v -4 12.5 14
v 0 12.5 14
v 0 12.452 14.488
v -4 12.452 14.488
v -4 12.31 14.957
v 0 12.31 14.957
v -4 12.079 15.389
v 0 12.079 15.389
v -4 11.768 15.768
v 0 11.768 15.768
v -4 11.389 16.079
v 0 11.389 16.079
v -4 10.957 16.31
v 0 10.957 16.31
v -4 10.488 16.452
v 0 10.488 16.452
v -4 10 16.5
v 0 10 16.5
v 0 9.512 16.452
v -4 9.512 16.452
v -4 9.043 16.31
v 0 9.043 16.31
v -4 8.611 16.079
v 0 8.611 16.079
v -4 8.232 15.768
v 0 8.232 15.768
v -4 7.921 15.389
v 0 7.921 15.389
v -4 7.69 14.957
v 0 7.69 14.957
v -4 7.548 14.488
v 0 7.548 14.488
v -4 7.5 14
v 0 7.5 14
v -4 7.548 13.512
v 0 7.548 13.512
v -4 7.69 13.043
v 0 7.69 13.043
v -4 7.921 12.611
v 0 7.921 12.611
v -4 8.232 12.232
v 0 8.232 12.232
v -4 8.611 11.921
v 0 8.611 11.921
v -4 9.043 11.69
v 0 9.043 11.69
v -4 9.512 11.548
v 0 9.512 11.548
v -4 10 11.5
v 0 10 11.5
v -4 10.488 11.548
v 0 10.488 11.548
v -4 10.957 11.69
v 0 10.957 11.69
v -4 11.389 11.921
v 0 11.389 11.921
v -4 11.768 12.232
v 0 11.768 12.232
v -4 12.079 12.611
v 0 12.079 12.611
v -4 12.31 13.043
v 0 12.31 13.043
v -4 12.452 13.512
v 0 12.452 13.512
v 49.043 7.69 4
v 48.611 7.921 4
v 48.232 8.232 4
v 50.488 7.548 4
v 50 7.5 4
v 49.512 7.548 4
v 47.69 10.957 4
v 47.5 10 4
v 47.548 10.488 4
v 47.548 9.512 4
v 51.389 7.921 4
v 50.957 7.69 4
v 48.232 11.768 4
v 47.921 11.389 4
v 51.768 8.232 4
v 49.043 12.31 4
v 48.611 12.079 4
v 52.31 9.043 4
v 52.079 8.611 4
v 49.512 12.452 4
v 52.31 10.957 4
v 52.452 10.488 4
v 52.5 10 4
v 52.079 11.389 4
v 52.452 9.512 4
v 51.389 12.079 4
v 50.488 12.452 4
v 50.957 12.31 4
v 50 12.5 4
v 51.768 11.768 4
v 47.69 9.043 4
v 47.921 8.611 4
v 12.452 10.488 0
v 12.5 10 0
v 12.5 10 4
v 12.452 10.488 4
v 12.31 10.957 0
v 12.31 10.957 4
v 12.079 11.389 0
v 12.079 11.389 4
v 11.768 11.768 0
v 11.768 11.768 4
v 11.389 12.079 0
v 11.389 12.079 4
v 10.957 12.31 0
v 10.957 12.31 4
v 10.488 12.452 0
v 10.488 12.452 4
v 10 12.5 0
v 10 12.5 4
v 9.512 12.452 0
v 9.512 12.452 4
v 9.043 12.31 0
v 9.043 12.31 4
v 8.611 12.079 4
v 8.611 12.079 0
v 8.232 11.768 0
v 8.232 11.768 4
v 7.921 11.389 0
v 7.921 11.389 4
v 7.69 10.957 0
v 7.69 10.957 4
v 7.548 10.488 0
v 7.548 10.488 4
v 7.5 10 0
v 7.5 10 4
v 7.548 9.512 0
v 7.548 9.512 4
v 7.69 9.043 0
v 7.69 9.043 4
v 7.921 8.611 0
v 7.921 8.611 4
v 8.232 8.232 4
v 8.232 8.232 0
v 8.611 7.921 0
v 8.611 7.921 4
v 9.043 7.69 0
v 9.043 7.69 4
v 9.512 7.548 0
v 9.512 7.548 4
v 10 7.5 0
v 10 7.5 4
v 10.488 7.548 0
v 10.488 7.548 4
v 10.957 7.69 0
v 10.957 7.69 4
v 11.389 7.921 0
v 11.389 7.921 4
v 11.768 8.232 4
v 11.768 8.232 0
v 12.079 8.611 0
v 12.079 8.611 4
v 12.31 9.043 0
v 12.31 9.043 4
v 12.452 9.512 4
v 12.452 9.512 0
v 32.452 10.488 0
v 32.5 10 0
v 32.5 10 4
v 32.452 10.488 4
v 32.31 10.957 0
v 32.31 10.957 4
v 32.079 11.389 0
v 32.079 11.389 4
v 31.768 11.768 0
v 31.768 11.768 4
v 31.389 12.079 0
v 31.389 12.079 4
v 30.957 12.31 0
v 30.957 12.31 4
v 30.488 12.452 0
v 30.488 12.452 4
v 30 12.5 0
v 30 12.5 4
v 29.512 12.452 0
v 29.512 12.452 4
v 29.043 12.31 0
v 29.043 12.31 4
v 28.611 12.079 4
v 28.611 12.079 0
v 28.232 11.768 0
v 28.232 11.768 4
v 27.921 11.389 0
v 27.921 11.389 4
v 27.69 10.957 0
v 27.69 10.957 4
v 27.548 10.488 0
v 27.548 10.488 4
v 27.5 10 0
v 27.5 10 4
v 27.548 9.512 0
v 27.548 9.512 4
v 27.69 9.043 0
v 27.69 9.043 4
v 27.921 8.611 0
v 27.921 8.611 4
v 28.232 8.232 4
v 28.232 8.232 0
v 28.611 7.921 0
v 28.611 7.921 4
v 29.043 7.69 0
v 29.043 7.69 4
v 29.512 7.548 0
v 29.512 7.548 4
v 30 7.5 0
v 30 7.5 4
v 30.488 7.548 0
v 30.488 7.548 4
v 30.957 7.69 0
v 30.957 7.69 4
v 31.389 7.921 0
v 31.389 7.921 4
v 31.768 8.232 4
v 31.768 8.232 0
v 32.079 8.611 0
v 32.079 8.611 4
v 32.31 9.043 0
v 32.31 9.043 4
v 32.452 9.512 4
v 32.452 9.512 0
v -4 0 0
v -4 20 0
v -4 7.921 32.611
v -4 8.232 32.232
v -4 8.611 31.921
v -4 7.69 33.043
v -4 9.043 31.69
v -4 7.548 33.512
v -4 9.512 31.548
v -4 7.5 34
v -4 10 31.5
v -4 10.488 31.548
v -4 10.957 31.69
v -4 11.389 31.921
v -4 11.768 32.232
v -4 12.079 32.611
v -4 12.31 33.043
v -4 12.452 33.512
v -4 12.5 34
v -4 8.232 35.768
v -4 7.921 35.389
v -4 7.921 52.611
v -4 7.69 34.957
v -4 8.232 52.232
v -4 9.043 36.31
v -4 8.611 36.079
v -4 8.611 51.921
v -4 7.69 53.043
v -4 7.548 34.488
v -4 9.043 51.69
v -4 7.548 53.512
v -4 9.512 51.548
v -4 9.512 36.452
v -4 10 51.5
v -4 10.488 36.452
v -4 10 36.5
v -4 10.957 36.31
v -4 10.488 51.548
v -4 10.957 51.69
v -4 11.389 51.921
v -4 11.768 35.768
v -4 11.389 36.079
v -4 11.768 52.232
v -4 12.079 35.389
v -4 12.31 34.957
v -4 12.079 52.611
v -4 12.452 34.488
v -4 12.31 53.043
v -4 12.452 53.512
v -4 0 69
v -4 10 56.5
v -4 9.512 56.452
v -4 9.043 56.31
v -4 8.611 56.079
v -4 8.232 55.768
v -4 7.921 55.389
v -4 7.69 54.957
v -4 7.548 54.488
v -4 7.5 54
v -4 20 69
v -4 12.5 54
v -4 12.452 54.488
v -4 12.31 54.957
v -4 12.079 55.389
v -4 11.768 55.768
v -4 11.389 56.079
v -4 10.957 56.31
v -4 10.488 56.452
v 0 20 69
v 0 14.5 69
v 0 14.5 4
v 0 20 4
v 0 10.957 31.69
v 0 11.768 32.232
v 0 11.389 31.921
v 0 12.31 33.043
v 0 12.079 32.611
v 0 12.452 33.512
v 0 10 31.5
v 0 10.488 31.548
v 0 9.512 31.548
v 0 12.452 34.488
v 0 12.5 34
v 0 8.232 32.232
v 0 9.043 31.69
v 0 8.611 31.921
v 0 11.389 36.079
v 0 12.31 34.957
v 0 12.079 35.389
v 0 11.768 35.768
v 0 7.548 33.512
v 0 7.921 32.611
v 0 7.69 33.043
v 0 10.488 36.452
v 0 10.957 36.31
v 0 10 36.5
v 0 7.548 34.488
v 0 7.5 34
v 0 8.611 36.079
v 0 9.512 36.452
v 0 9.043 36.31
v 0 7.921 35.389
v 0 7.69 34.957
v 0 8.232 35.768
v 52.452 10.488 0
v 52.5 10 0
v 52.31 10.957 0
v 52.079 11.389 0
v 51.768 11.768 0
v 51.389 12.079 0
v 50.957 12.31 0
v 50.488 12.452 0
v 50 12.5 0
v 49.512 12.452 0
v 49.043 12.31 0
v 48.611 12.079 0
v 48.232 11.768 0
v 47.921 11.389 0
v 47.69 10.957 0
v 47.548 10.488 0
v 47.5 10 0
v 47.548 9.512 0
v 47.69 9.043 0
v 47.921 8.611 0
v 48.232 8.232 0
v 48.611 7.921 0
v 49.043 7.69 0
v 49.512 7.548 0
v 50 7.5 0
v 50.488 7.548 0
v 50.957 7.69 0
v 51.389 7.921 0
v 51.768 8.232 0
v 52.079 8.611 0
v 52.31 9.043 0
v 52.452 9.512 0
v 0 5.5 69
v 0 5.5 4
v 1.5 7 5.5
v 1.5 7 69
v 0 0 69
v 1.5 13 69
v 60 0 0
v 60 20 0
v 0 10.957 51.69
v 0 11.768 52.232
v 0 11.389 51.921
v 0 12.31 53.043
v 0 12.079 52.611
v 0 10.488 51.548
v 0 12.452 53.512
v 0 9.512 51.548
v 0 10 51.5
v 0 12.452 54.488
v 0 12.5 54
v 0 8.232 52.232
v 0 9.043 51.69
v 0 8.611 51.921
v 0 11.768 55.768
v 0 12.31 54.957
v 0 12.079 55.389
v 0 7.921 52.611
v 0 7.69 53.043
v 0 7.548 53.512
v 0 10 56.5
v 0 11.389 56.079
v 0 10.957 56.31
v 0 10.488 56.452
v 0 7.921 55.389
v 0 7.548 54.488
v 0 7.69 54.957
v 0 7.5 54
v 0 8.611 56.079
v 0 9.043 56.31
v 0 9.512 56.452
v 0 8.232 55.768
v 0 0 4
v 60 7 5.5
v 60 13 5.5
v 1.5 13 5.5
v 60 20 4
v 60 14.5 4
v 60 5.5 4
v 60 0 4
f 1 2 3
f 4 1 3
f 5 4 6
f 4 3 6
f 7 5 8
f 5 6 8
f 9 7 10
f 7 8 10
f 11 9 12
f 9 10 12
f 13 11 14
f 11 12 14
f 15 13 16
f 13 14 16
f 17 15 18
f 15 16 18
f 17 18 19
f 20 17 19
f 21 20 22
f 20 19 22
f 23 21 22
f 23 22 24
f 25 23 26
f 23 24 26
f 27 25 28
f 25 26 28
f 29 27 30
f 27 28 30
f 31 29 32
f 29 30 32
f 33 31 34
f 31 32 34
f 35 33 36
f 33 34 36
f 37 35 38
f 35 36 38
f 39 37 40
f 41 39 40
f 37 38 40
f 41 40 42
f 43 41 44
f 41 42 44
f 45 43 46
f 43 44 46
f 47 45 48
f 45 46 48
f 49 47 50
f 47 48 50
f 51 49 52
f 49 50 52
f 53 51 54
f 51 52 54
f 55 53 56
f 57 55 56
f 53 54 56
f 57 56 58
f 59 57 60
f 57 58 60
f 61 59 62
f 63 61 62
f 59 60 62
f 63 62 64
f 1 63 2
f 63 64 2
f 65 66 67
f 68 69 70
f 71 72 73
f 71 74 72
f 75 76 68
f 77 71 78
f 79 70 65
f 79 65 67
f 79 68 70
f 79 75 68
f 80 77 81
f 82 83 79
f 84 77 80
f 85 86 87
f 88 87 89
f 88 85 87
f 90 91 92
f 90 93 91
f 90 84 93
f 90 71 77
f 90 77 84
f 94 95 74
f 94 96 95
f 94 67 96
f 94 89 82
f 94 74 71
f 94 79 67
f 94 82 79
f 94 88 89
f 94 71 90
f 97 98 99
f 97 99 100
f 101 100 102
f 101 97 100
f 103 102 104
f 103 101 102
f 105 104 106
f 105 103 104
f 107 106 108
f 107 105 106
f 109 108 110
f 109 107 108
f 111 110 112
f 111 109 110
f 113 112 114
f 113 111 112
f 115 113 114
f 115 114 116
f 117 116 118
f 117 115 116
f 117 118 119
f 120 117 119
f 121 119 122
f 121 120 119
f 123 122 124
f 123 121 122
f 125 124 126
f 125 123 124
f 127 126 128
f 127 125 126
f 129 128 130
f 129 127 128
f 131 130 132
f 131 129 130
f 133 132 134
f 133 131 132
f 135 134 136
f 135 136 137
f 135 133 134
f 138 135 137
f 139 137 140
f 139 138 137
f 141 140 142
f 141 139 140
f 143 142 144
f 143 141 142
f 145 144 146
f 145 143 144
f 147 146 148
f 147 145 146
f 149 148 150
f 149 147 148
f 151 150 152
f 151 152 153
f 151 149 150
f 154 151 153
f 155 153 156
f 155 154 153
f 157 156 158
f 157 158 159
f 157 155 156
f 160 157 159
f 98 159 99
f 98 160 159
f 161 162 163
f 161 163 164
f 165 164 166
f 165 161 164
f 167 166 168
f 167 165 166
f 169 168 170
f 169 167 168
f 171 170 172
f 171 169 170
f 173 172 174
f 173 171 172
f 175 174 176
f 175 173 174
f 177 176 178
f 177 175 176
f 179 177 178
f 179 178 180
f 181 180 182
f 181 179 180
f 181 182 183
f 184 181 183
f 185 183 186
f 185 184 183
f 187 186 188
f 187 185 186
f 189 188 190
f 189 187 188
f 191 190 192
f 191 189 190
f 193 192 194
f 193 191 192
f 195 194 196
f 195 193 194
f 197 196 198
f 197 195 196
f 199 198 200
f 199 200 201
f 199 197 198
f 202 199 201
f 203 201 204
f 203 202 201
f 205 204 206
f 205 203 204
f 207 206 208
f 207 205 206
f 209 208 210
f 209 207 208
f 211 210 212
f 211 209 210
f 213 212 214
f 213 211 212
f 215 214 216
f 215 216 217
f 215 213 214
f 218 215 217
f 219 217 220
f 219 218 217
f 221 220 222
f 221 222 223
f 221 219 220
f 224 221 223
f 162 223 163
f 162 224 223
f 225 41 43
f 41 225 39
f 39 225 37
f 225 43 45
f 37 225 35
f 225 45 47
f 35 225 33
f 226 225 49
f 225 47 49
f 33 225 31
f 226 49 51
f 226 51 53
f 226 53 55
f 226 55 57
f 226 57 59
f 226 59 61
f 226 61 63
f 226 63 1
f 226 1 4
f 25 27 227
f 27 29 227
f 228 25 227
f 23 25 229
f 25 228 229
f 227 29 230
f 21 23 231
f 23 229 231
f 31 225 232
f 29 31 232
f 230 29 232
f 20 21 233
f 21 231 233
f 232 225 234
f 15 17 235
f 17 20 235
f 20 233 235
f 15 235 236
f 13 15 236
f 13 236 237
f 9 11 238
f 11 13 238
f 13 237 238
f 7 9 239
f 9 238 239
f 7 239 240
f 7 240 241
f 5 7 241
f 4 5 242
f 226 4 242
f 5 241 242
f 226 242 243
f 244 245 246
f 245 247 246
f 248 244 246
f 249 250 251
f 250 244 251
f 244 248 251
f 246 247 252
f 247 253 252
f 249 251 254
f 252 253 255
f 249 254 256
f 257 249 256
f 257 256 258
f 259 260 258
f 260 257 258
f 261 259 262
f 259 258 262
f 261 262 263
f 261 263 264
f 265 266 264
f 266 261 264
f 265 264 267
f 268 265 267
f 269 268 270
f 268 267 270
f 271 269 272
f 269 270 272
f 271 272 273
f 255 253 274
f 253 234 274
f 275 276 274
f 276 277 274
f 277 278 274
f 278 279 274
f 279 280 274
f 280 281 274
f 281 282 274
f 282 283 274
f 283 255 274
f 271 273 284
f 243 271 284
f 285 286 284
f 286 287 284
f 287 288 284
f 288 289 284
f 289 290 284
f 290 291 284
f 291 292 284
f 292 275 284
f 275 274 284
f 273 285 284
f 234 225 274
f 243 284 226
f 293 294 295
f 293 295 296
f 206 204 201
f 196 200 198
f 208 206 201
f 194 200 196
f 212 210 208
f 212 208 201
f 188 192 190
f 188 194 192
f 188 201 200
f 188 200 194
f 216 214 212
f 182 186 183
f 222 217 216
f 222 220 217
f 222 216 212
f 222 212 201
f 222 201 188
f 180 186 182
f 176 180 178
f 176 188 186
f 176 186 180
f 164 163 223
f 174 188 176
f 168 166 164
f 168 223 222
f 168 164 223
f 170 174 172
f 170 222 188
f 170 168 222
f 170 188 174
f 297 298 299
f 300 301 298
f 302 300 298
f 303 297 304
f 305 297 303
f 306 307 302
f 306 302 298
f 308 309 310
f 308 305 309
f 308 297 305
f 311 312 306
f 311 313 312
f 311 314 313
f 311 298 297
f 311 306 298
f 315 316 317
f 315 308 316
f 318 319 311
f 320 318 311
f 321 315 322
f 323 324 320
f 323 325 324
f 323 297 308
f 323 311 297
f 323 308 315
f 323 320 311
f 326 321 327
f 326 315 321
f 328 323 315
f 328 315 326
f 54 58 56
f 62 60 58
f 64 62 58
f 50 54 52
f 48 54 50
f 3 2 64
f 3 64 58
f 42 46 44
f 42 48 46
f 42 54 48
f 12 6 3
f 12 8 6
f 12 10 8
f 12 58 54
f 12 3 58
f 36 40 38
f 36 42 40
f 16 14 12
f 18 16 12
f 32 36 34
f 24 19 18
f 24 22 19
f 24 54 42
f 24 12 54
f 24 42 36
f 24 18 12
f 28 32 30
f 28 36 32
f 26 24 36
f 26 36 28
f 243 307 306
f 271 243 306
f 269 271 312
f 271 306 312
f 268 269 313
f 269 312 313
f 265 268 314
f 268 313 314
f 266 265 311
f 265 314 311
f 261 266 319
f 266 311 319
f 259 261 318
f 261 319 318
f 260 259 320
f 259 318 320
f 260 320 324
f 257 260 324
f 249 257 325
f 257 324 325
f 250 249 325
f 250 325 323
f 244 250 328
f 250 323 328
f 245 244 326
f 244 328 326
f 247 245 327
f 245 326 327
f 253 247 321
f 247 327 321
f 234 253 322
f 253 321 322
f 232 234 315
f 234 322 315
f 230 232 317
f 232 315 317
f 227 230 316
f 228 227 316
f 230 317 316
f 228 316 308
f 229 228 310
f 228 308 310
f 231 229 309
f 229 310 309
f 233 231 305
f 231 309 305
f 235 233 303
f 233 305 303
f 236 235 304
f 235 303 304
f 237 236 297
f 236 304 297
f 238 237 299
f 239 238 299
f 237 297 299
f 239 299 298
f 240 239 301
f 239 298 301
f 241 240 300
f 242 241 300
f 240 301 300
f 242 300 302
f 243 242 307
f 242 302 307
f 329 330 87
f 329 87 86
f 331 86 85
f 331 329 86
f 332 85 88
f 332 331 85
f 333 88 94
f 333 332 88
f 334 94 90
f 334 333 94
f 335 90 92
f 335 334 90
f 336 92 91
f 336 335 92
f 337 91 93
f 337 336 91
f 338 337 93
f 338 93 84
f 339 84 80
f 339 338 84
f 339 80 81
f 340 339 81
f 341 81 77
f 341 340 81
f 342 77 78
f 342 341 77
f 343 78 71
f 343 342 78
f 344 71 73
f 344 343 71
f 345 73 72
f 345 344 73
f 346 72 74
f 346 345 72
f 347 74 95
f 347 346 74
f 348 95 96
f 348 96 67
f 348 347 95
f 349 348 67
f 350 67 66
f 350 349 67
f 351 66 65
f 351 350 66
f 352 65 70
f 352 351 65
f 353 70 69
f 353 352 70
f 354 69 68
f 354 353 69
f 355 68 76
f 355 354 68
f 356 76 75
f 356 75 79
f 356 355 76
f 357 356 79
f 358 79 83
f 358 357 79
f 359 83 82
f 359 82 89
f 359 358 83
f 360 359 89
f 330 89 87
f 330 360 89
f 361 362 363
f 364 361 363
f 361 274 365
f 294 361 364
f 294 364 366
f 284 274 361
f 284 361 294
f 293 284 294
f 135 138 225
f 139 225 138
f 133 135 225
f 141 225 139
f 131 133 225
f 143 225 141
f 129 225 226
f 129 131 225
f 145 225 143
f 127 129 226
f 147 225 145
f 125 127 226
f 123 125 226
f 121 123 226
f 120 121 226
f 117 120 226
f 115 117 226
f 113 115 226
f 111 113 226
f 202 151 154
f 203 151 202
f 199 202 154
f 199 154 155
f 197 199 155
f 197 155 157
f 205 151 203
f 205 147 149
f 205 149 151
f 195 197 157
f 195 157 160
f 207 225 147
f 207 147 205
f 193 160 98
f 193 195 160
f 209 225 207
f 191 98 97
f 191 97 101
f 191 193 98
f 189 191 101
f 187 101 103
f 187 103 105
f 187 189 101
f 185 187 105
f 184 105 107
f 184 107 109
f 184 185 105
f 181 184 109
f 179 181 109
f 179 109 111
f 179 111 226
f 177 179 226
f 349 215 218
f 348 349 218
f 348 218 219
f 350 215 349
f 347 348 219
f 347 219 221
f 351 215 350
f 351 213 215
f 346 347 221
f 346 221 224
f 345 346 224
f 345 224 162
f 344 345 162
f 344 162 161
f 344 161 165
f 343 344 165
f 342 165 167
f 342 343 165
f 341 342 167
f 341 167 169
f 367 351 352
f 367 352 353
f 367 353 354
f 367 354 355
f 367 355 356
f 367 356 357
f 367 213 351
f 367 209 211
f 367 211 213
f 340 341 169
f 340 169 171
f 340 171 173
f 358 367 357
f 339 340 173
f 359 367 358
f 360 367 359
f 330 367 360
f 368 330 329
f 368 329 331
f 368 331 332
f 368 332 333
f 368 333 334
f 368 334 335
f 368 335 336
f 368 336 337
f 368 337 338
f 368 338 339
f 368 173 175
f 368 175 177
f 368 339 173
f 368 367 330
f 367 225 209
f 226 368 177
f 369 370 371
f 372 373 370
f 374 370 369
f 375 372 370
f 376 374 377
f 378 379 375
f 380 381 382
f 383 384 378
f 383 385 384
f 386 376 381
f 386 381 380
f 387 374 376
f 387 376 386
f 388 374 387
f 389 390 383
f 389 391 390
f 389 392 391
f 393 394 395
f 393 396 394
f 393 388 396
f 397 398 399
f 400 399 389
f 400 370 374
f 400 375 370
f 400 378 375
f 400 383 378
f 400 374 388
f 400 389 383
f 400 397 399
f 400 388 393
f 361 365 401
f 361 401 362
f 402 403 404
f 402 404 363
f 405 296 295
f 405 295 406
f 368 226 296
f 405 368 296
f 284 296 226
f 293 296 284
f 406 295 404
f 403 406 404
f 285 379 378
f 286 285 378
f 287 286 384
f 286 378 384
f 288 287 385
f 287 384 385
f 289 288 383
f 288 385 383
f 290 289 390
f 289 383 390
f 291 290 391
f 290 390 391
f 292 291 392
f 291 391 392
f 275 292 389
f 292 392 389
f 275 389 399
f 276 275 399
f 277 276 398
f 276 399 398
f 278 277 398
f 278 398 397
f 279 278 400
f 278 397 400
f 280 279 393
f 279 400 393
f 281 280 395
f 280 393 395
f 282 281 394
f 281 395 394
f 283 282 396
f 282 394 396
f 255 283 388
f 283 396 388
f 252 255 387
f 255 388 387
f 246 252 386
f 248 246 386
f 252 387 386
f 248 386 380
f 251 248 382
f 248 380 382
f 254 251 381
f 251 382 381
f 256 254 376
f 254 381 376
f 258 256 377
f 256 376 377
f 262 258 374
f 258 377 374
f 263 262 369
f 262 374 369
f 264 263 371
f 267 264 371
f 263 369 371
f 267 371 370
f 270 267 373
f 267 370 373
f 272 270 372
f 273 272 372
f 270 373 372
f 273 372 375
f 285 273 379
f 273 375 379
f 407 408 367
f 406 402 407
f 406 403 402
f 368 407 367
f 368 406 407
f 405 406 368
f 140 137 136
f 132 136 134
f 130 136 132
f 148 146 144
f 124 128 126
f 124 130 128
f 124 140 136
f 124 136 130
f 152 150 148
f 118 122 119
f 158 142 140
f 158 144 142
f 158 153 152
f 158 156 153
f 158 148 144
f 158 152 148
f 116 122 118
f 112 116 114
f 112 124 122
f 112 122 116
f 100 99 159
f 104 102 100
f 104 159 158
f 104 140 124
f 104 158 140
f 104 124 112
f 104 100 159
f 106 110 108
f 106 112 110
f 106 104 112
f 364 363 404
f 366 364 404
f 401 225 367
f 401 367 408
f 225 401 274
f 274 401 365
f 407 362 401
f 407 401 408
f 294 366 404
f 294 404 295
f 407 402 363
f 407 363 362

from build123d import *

# Parameters (mm, degrees)
F0_W     = 60
F0_H     = 20
F0_R     = 2.5
F1_DEPTH = 4
F2_W     = 20
F2_H     = 69
F2_R     = 2.5
F3_DEPTH = 4
F5_DEPTH = 60
F7_DEPTH = 65


with BuildPart() as f1:
    # F0 (on Top) → F1 (new body)
    with BuildSketch(Plane.XY):
        with Locations((30, 10)):
            Rectangle(F0_W, F0_H)
        with Locations((10, 10)):
            Circle(F0_R, mode=Mode.SUBTRACT)
        with Locations((30, 10)):
            Circle(F0_R, mode=Mode.SUBTRACT)
        with Locations((50, 10)):
            Circle(F0_R, mode=Mode.SUBTRACT)
    extrude(amount=F1_DEPTH)

    # F2 (on Right) → F3 (join)
    with BuildSketch(Plane.YZ):
        with Locations((10, 34.5)):
            Rectangle(F2_W, F2_H)
        with Locations((10, 14)):
            Circle(F2_R, mode=Mode.SUBTRACT)
        with Locations((10, 34)):
            Circle(F2_R, mode=Mode.SUBTRACT)
        with Locations((10, 54)):
            Circle(F2_R, mode=Mode.SUBTRACT)
    extrude(amount=-F3_DEPTH)

    # F4 (on face) → F5 (join, through all)
    with BuildSketch(Plane.YZ.offset(60)):
        Polygon((7, 5.5), (5.5, 4), (14.5, 4), (13, 5.5), align=None)
    extrude(amount=-F5_DEPTH)

    # F6 (on face) → F7 (join, through all)
    with BuildSketch(Plane.XY.offset(69)):
        Polygon((1.5, 13), (0, 14.5), (0, 5.5), (1.5, 7), align=None)
    extrude(amount=-F7_DEPTH)


solid = f1.part
